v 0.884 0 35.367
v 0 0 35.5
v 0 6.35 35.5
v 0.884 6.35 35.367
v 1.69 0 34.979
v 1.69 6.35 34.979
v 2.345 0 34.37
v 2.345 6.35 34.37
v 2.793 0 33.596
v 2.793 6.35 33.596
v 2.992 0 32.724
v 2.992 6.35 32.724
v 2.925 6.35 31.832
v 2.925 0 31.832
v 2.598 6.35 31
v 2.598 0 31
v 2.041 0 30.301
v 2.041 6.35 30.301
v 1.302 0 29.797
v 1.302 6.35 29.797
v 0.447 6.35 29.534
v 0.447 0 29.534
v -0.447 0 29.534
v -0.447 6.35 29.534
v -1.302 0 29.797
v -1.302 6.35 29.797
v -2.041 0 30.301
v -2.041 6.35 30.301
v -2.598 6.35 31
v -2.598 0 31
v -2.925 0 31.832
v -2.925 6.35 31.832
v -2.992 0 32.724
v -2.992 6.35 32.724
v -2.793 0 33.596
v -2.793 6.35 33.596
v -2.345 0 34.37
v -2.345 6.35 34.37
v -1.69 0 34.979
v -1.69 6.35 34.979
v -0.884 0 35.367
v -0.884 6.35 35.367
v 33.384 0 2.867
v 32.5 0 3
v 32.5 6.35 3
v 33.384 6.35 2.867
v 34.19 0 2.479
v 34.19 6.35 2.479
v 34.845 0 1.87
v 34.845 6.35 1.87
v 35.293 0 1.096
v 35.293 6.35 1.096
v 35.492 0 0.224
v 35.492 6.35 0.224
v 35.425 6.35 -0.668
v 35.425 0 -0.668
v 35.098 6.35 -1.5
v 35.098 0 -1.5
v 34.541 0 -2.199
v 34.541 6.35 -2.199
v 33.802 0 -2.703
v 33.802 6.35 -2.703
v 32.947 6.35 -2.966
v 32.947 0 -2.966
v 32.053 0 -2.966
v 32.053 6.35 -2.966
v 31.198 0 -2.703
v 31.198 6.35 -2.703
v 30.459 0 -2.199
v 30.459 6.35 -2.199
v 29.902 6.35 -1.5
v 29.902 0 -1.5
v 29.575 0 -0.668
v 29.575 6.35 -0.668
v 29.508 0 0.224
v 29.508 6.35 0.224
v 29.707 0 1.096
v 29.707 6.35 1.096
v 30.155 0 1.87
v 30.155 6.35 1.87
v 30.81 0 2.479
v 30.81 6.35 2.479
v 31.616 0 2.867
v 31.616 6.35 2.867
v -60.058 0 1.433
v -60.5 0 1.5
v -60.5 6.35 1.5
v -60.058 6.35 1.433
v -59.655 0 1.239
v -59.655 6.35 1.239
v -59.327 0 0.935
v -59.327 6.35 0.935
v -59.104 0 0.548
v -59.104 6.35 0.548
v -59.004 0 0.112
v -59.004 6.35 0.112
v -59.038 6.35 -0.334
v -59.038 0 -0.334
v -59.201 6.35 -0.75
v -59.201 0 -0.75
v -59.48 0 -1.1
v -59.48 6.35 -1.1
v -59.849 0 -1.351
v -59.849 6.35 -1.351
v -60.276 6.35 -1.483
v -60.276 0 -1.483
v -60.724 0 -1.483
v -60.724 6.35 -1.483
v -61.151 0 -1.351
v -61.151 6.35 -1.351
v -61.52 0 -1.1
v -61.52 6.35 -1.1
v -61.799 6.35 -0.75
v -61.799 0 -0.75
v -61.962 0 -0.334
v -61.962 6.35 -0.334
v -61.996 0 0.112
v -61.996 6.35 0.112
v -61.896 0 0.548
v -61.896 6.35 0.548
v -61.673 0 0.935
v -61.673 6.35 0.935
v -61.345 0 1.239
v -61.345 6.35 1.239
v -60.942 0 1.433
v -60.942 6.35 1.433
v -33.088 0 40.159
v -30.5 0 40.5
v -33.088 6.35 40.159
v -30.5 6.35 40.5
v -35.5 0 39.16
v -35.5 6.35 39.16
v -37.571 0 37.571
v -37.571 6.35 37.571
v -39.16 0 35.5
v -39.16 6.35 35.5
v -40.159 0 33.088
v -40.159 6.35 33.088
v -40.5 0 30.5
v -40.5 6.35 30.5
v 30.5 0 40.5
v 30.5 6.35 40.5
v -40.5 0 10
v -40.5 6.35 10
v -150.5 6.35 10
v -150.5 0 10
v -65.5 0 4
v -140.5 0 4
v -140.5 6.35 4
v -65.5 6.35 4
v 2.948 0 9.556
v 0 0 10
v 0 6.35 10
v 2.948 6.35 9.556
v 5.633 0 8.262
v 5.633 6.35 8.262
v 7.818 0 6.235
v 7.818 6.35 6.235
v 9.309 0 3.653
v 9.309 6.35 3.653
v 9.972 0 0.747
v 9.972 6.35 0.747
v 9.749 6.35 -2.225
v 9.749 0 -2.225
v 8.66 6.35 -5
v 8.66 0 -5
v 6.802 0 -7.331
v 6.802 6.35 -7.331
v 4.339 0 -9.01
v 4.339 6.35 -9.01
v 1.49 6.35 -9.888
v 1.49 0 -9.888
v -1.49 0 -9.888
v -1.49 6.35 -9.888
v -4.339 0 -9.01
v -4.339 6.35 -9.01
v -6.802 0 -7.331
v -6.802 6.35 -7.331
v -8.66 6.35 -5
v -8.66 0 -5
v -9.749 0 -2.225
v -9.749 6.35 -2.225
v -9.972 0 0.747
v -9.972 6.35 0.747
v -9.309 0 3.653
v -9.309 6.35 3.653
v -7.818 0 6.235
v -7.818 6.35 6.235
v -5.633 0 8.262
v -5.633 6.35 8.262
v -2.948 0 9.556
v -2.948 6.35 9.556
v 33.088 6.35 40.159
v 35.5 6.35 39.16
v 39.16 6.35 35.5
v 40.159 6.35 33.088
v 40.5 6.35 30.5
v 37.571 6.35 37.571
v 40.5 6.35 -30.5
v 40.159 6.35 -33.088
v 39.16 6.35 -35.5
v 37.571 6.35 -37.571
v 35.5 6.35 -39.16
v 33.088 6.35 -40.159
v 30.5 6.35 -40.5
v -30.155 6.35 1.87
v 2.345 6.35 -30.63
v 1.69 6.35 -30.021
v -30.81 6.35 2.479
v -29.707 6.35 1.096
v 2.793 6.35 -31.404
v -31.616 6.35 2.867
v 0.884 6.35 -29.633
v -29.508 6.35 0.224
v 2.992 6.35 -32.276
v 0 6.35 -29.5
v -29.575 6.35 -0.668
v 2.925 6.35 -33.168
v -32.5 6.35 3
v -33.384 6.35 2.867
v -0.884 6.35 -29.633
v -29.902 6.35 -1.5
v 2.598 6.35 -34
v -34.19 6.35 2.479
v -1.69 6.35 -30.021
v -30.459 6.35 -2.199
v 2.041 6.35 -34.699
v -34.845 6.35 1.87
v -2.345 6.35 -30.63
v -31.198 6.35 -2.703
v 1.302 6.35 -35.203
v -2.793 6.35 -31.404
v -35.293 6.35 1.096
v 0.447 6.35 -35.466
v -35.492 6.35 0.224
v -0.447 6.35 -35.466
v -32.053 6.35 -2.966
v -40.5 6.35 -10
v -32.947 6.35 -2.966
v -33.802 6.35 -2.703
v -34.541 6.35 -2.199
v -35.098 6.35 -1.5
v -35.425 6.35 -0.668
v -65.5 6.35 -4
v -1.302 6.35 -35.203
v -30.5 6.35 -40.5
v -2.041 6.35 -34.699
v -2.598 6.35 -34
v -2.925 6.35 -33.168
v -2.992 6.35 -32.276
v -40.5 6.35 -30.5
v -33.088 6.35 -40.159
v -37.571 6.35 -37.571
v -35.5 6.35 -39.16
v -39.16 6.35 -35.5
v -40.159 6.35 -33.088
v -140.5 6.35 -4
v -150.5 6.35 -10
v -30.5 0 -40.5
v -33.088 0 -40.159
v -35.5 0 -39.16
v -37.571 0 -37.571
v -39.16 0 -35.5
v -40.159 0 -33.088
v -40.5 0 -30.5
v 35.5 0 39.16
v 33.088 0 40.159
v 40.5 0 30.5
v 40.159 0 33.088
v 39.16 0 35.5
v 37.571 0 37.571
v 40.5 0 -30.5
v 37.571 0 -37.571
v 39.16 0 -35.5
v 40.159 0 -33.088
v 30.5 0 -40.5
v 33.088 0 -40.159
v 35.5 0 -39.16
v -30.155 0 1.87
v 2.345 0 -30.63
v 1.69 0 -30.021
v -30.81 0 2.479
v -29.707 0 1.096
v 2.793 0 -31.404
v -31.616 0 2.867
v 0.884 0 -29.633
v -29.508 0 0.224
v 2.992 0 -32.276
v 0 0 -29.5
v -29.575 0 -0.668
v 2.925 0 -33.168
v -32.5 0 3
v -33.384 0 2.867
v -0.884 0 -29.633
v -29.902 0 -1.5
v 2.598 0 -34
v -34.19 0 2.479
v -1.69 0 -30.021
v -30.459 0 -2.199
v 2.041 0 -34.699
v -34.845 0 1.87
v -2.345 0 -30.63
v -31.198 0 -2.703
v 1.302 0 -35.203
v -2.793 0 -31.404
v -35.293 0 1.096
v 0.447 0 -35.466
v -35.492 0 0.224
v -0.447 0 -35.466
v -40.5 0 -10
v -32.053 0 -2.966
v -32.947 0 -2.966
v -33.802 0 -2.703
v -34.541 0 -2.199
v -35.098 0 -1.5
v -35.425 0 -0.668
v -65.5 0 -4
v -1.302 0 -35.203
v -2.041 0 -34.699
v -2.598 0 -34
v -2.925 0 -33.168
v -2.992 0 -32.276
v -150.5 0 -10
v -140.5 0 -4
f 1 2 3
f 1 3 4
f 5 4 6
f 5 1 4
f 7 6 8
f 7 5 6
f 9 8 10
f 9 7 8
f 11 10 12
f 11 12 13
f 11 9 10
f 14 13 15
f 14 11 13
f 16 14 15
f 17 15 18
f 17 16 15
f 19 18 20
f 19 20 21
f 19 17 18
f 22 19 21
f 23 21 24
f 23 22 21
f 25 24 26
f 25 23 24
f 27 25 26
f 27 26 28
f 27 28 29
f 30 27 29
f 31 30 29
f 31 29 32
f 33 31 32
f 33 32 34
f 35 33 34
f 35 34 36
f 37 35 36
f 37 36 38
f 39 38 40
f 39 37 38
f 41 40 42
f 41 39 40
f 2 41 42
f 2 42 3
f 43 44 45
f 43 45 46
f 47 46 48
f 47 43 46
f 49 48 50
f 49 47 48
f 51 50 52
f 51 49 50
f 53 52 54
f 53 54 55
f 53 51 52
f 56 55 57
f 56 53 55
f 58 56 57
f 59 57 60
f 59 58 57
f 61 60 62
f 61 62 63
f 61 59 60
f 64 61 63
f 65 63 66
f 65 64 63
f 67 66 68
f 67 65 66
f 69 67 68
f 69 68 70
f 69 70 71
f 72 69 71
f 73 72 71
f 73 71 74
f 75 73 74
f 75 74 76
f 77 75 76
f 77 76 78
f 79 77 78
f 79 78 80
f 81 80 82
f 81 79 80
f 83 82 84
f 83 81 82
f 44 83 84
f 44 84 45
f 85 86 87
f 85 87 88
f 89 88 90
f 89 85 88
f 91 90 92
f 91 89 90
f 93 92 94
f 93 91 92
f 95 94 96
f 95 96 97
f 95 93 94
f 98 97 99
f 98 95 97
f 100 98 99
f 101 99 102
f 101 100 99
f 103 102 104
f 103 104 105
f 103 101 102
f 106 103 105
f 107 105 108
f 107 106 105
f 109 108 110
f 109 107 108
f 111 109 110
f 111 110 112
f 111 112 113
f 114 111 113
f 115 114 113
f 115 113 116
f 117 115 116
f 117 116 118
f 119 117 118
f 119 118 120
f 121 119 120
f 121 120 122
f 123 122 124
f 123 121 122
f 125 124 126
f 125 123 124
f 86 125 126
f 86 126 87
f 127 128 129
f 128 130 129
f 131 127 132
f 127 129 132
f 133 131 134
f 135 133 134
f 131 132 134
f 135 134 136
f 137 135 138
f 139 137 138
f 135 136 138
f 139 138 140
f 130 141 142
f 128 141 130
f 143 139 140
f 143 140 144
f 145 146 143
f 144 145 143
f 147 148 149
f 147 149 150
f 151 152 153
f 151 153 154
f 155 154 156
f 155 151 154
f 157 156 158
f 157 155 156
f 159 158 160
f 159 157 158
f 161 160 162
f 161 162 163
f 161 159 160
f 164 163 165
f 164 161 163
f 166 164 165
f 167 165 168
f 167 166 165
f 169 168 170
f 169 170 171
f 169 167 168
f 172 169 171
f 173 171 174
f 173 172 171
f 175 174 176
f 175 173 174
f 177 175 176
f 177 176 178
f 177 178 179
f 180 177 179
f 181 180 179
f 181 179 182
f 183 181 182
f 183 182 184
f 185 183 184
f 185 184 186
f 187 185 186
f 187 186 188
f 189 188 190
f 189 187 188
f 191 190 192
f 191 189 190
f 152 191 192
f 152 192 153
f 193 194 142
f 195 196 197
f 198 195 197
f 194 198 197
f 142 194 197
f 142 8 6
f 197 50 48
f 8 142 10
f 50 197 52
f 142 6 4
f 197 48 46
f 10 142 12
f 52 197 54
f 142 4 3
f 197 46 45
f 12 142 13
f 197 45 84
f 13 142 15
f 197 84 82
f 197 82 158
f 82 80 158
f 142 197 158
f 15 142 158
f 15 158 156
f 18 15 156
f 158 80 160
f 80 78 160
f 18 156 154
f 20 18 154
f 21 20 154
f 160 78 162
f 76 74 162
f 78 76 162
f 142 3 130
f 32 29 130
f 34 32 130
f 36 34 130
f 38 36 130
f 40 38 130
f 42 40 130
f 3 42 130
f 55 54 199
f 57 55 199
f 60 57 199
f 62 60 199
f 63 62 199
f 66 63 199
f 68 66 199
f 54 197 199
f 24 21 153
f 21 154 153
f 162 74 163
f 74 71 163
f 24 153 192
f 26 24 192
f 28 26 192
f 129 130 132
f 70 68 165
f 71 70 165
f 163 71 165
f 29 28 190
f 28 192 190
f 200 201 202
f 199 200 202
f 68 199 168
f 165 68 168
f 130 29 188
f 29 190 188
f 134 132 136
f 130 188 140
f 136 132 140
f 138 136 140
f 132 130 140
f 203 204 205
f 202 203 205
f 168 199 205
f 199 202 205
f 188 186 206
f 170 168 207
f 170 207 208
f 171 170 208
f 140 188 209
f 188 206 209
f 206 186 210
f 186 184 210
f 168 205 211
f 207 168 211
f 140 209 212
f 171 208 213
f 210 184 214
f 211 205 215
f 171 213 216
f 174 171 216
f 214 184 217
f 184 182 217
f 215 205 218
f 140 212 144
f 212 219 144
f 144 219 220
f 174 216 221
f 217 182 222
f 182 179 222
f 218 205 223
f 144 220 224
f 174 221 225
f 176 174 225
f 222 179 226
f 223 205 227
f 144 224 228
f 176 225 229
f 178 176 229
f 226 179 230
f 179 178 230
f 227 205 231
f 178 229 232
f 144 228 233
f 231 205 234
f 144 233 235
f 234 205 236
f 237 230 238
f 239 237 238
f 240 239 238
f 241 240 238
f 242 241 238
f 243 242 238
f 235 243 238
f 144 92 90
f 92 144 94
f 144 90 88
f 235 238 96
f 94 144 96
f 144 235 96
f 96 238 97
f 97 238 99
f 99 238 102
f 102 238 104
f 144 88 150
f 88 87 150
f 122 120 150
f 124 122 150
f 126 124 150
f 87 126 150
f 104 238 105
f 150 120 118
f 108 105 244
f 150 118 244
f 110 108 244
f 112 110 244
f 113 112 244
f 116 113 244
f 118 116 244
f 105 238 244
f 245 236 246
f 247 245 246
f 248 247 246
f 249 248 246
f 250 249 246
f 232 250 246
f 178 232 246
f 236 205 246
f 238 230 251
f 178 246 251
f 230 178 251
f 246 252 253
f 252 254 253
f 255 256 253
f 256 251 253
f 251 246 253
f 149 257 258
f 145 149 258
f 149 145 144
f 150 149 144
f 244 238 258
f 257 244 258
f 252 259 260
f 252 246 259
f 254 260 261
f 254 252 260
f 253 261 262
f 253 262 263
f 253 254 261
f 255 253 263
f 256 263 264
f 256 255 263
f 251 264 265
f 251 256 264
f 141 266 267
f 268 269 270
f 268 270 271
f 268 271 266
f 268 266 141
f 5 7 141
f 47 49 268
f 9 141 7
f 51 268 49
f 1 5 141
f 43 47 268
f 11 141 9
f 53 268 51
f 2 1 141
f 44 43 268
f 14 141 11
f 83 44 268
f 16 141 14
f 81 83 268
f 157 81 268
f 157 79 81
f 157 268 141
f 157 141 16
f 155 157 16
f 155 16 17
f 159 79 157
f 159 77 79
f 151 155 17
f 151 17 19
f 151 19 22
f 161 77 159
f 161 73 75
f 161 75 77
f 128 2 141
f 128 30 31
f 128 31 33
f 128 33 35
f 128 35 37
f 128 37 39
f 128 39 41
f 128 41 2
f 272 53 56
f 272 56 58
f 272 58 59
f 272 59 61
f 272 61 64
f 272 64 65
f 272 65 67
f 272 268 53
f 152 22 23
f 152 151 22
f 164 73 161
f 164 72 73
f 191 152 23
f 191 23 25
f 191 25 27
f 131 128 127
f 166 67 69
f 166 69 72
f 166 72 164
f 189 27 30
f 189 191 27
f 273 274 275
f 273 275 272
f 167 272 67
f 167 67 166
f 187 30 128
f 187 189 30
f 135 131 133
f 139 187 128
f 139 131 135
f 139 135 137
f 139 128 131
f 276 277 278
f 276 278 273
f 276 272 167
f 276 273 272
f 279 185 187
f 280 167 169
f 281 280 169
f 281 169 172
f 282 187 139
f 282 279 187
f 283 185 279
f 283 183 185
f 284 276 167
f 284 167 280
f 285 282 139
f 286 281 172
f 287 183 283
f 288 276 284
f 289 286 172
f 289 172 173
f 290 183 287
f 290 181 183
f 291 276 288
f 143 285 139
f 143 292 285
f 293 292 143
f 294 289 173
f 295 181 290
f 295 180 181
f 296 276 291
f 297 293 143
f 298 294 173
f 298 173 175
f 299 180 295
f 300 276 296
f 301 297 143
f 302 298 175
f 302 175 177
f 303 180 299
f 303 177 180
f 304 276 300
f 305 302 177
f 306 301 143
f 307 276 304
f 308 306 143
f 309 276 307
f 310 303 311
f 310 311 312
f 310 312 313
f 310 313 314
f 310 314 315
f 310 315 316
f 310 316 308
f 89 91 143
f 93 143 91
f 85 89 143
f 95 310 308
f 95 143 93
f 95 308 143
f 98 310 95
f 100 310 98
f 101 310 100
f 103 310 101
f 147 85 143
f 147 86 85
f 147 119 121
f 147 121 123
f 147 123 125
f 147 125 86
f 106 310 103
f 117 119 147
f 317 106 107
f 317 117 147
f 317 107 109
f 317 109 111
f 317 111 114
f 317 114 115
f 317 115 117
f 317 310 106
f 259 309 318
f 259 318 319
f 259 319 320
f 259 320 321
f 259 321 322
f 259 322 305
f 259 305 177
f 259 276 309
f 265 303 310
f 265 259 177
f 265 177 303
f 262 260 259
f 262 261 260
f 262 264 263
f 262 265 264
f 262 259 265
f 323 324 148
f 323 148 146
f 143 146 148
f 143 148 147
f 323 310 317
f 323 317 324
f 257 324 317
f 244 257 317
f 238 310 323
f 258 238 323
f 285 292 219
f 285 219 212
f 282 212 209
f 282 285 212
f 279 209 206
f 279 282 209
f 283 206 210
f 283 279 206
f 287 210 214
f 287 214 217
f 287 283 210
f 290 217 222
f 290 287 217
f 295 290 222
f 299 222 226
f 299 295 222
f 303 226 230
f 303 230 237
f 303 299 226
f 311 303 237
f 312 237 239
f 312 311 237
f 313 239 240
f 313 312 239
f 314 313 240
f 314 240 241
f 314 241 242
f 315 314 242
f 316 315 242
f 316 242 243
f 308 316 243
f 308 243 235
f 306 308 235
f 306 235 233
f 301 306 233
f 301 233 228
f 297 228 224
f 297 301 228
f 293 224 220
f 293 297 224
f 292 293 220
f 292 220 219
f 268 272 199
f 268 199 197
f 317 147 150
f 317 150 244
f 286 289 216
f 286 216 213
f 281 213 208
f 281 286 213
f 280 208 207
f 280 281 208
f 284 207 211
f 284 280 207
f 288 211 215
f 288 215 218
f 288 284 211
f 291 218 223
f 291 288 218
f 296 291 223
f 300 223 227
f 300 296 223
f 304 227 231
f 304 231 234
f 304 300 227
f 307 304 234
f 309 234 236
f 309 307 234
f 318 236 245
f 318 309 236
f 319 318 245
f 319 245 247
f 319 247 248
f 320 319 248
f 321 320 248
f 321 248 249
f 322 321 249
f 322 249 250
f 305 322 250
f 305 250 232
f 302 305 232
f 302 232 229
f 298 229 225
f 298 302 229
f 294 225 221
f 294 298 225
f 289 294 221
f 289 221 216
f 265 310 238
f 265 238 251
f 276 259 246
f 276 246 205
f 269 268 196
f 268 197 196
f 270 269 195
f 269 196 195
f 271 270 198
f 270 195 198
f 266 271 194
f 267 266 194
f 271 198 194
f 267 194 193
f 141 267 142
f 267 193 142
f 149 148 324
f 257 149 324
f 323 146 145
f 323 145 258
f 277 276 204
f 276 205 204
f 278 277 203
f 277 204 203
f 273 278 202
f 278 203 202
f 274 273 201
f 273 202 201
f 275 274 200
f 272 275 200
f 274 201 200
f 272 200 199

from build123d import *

# Parameters (mm, degrees)
SKETCH1_R           = 10
SKETCH1_R_2         = 3
SKETCH1_R_3         = 1.5
SKETCH1_W           = 75
SKETCH1_H           = 8
BOSS_EXTRUDE1_DEPTH = 6.35
FILLET1_R           = 10


with BuildPart() as part:
    # Sketch1 → Boss-Extrude1 (new body)
    with BuildSketch(Plane(origin=(0, 0, 0), x_dir=(1, 0, 0), z_dir=(0, 1, 0))):
        Polygon((-40.5, 40.5), (40.5, 40.5), (40.5, -40.5), (-40.5, -40.5), (-40.5, -10), (-140.5, -10), (-150.5, -10), (-150.5, 10), (-140.5, 10), (-40.5, 10), align=None)
        with Locations(Location((0, 0, 0), (0, 0, 270))):
            Circle(SKETCH1_R, mode=Mode.SUBTRACT)
        with Locations(Location((0, 32.5, 0), (0, 0, 270))):
            Circle(SKETCH1_R_2, mode=Mode.SUBTRACT)
        with Locations(Location((-32.5, 0, 0), (0, 0, 270))):
            Circle(SKETCH1_R_2, mode=Mode.SUBTRACT)
        with Locations(Location((0, -32.5, 0), (0, 0, 270))):
            Circle(SKETCH1_R_2, mode=Mode.SUBTRACT)
        with Locations(Location((32.5, 0, 0), (0, 0, 270))):
            Circle(SKETCH1_R_2, mode=Mode.SUBTRACT)
        with Locations(Location((-60.5, 0, 0), (0, 0, 270))):
            Circle(SKETCH1_R_3, mode=Mode.SUBTRACT)
        with Locations((-103, 0)):
            Rectangle(SKETCH1_W, SKETCH1_H, mode=Mode.SUBTRACT)
    extrude(amount=BOSS_EXTRUDE1_DEPTH)

    # Fillet1
    fillet1_edges = [part.edges().sort_by_distance(p)[0] for p in [
        (40.5, 3.175, 40.5),
        (-40.5, 3.175, 40.5),
        (-40.5, 3.175, -40.5),
        (40.5, 3.175, -40.5),
    ]]
    fillet(fillet1_edges, radius=FILLET1_R)


solid = part.part
